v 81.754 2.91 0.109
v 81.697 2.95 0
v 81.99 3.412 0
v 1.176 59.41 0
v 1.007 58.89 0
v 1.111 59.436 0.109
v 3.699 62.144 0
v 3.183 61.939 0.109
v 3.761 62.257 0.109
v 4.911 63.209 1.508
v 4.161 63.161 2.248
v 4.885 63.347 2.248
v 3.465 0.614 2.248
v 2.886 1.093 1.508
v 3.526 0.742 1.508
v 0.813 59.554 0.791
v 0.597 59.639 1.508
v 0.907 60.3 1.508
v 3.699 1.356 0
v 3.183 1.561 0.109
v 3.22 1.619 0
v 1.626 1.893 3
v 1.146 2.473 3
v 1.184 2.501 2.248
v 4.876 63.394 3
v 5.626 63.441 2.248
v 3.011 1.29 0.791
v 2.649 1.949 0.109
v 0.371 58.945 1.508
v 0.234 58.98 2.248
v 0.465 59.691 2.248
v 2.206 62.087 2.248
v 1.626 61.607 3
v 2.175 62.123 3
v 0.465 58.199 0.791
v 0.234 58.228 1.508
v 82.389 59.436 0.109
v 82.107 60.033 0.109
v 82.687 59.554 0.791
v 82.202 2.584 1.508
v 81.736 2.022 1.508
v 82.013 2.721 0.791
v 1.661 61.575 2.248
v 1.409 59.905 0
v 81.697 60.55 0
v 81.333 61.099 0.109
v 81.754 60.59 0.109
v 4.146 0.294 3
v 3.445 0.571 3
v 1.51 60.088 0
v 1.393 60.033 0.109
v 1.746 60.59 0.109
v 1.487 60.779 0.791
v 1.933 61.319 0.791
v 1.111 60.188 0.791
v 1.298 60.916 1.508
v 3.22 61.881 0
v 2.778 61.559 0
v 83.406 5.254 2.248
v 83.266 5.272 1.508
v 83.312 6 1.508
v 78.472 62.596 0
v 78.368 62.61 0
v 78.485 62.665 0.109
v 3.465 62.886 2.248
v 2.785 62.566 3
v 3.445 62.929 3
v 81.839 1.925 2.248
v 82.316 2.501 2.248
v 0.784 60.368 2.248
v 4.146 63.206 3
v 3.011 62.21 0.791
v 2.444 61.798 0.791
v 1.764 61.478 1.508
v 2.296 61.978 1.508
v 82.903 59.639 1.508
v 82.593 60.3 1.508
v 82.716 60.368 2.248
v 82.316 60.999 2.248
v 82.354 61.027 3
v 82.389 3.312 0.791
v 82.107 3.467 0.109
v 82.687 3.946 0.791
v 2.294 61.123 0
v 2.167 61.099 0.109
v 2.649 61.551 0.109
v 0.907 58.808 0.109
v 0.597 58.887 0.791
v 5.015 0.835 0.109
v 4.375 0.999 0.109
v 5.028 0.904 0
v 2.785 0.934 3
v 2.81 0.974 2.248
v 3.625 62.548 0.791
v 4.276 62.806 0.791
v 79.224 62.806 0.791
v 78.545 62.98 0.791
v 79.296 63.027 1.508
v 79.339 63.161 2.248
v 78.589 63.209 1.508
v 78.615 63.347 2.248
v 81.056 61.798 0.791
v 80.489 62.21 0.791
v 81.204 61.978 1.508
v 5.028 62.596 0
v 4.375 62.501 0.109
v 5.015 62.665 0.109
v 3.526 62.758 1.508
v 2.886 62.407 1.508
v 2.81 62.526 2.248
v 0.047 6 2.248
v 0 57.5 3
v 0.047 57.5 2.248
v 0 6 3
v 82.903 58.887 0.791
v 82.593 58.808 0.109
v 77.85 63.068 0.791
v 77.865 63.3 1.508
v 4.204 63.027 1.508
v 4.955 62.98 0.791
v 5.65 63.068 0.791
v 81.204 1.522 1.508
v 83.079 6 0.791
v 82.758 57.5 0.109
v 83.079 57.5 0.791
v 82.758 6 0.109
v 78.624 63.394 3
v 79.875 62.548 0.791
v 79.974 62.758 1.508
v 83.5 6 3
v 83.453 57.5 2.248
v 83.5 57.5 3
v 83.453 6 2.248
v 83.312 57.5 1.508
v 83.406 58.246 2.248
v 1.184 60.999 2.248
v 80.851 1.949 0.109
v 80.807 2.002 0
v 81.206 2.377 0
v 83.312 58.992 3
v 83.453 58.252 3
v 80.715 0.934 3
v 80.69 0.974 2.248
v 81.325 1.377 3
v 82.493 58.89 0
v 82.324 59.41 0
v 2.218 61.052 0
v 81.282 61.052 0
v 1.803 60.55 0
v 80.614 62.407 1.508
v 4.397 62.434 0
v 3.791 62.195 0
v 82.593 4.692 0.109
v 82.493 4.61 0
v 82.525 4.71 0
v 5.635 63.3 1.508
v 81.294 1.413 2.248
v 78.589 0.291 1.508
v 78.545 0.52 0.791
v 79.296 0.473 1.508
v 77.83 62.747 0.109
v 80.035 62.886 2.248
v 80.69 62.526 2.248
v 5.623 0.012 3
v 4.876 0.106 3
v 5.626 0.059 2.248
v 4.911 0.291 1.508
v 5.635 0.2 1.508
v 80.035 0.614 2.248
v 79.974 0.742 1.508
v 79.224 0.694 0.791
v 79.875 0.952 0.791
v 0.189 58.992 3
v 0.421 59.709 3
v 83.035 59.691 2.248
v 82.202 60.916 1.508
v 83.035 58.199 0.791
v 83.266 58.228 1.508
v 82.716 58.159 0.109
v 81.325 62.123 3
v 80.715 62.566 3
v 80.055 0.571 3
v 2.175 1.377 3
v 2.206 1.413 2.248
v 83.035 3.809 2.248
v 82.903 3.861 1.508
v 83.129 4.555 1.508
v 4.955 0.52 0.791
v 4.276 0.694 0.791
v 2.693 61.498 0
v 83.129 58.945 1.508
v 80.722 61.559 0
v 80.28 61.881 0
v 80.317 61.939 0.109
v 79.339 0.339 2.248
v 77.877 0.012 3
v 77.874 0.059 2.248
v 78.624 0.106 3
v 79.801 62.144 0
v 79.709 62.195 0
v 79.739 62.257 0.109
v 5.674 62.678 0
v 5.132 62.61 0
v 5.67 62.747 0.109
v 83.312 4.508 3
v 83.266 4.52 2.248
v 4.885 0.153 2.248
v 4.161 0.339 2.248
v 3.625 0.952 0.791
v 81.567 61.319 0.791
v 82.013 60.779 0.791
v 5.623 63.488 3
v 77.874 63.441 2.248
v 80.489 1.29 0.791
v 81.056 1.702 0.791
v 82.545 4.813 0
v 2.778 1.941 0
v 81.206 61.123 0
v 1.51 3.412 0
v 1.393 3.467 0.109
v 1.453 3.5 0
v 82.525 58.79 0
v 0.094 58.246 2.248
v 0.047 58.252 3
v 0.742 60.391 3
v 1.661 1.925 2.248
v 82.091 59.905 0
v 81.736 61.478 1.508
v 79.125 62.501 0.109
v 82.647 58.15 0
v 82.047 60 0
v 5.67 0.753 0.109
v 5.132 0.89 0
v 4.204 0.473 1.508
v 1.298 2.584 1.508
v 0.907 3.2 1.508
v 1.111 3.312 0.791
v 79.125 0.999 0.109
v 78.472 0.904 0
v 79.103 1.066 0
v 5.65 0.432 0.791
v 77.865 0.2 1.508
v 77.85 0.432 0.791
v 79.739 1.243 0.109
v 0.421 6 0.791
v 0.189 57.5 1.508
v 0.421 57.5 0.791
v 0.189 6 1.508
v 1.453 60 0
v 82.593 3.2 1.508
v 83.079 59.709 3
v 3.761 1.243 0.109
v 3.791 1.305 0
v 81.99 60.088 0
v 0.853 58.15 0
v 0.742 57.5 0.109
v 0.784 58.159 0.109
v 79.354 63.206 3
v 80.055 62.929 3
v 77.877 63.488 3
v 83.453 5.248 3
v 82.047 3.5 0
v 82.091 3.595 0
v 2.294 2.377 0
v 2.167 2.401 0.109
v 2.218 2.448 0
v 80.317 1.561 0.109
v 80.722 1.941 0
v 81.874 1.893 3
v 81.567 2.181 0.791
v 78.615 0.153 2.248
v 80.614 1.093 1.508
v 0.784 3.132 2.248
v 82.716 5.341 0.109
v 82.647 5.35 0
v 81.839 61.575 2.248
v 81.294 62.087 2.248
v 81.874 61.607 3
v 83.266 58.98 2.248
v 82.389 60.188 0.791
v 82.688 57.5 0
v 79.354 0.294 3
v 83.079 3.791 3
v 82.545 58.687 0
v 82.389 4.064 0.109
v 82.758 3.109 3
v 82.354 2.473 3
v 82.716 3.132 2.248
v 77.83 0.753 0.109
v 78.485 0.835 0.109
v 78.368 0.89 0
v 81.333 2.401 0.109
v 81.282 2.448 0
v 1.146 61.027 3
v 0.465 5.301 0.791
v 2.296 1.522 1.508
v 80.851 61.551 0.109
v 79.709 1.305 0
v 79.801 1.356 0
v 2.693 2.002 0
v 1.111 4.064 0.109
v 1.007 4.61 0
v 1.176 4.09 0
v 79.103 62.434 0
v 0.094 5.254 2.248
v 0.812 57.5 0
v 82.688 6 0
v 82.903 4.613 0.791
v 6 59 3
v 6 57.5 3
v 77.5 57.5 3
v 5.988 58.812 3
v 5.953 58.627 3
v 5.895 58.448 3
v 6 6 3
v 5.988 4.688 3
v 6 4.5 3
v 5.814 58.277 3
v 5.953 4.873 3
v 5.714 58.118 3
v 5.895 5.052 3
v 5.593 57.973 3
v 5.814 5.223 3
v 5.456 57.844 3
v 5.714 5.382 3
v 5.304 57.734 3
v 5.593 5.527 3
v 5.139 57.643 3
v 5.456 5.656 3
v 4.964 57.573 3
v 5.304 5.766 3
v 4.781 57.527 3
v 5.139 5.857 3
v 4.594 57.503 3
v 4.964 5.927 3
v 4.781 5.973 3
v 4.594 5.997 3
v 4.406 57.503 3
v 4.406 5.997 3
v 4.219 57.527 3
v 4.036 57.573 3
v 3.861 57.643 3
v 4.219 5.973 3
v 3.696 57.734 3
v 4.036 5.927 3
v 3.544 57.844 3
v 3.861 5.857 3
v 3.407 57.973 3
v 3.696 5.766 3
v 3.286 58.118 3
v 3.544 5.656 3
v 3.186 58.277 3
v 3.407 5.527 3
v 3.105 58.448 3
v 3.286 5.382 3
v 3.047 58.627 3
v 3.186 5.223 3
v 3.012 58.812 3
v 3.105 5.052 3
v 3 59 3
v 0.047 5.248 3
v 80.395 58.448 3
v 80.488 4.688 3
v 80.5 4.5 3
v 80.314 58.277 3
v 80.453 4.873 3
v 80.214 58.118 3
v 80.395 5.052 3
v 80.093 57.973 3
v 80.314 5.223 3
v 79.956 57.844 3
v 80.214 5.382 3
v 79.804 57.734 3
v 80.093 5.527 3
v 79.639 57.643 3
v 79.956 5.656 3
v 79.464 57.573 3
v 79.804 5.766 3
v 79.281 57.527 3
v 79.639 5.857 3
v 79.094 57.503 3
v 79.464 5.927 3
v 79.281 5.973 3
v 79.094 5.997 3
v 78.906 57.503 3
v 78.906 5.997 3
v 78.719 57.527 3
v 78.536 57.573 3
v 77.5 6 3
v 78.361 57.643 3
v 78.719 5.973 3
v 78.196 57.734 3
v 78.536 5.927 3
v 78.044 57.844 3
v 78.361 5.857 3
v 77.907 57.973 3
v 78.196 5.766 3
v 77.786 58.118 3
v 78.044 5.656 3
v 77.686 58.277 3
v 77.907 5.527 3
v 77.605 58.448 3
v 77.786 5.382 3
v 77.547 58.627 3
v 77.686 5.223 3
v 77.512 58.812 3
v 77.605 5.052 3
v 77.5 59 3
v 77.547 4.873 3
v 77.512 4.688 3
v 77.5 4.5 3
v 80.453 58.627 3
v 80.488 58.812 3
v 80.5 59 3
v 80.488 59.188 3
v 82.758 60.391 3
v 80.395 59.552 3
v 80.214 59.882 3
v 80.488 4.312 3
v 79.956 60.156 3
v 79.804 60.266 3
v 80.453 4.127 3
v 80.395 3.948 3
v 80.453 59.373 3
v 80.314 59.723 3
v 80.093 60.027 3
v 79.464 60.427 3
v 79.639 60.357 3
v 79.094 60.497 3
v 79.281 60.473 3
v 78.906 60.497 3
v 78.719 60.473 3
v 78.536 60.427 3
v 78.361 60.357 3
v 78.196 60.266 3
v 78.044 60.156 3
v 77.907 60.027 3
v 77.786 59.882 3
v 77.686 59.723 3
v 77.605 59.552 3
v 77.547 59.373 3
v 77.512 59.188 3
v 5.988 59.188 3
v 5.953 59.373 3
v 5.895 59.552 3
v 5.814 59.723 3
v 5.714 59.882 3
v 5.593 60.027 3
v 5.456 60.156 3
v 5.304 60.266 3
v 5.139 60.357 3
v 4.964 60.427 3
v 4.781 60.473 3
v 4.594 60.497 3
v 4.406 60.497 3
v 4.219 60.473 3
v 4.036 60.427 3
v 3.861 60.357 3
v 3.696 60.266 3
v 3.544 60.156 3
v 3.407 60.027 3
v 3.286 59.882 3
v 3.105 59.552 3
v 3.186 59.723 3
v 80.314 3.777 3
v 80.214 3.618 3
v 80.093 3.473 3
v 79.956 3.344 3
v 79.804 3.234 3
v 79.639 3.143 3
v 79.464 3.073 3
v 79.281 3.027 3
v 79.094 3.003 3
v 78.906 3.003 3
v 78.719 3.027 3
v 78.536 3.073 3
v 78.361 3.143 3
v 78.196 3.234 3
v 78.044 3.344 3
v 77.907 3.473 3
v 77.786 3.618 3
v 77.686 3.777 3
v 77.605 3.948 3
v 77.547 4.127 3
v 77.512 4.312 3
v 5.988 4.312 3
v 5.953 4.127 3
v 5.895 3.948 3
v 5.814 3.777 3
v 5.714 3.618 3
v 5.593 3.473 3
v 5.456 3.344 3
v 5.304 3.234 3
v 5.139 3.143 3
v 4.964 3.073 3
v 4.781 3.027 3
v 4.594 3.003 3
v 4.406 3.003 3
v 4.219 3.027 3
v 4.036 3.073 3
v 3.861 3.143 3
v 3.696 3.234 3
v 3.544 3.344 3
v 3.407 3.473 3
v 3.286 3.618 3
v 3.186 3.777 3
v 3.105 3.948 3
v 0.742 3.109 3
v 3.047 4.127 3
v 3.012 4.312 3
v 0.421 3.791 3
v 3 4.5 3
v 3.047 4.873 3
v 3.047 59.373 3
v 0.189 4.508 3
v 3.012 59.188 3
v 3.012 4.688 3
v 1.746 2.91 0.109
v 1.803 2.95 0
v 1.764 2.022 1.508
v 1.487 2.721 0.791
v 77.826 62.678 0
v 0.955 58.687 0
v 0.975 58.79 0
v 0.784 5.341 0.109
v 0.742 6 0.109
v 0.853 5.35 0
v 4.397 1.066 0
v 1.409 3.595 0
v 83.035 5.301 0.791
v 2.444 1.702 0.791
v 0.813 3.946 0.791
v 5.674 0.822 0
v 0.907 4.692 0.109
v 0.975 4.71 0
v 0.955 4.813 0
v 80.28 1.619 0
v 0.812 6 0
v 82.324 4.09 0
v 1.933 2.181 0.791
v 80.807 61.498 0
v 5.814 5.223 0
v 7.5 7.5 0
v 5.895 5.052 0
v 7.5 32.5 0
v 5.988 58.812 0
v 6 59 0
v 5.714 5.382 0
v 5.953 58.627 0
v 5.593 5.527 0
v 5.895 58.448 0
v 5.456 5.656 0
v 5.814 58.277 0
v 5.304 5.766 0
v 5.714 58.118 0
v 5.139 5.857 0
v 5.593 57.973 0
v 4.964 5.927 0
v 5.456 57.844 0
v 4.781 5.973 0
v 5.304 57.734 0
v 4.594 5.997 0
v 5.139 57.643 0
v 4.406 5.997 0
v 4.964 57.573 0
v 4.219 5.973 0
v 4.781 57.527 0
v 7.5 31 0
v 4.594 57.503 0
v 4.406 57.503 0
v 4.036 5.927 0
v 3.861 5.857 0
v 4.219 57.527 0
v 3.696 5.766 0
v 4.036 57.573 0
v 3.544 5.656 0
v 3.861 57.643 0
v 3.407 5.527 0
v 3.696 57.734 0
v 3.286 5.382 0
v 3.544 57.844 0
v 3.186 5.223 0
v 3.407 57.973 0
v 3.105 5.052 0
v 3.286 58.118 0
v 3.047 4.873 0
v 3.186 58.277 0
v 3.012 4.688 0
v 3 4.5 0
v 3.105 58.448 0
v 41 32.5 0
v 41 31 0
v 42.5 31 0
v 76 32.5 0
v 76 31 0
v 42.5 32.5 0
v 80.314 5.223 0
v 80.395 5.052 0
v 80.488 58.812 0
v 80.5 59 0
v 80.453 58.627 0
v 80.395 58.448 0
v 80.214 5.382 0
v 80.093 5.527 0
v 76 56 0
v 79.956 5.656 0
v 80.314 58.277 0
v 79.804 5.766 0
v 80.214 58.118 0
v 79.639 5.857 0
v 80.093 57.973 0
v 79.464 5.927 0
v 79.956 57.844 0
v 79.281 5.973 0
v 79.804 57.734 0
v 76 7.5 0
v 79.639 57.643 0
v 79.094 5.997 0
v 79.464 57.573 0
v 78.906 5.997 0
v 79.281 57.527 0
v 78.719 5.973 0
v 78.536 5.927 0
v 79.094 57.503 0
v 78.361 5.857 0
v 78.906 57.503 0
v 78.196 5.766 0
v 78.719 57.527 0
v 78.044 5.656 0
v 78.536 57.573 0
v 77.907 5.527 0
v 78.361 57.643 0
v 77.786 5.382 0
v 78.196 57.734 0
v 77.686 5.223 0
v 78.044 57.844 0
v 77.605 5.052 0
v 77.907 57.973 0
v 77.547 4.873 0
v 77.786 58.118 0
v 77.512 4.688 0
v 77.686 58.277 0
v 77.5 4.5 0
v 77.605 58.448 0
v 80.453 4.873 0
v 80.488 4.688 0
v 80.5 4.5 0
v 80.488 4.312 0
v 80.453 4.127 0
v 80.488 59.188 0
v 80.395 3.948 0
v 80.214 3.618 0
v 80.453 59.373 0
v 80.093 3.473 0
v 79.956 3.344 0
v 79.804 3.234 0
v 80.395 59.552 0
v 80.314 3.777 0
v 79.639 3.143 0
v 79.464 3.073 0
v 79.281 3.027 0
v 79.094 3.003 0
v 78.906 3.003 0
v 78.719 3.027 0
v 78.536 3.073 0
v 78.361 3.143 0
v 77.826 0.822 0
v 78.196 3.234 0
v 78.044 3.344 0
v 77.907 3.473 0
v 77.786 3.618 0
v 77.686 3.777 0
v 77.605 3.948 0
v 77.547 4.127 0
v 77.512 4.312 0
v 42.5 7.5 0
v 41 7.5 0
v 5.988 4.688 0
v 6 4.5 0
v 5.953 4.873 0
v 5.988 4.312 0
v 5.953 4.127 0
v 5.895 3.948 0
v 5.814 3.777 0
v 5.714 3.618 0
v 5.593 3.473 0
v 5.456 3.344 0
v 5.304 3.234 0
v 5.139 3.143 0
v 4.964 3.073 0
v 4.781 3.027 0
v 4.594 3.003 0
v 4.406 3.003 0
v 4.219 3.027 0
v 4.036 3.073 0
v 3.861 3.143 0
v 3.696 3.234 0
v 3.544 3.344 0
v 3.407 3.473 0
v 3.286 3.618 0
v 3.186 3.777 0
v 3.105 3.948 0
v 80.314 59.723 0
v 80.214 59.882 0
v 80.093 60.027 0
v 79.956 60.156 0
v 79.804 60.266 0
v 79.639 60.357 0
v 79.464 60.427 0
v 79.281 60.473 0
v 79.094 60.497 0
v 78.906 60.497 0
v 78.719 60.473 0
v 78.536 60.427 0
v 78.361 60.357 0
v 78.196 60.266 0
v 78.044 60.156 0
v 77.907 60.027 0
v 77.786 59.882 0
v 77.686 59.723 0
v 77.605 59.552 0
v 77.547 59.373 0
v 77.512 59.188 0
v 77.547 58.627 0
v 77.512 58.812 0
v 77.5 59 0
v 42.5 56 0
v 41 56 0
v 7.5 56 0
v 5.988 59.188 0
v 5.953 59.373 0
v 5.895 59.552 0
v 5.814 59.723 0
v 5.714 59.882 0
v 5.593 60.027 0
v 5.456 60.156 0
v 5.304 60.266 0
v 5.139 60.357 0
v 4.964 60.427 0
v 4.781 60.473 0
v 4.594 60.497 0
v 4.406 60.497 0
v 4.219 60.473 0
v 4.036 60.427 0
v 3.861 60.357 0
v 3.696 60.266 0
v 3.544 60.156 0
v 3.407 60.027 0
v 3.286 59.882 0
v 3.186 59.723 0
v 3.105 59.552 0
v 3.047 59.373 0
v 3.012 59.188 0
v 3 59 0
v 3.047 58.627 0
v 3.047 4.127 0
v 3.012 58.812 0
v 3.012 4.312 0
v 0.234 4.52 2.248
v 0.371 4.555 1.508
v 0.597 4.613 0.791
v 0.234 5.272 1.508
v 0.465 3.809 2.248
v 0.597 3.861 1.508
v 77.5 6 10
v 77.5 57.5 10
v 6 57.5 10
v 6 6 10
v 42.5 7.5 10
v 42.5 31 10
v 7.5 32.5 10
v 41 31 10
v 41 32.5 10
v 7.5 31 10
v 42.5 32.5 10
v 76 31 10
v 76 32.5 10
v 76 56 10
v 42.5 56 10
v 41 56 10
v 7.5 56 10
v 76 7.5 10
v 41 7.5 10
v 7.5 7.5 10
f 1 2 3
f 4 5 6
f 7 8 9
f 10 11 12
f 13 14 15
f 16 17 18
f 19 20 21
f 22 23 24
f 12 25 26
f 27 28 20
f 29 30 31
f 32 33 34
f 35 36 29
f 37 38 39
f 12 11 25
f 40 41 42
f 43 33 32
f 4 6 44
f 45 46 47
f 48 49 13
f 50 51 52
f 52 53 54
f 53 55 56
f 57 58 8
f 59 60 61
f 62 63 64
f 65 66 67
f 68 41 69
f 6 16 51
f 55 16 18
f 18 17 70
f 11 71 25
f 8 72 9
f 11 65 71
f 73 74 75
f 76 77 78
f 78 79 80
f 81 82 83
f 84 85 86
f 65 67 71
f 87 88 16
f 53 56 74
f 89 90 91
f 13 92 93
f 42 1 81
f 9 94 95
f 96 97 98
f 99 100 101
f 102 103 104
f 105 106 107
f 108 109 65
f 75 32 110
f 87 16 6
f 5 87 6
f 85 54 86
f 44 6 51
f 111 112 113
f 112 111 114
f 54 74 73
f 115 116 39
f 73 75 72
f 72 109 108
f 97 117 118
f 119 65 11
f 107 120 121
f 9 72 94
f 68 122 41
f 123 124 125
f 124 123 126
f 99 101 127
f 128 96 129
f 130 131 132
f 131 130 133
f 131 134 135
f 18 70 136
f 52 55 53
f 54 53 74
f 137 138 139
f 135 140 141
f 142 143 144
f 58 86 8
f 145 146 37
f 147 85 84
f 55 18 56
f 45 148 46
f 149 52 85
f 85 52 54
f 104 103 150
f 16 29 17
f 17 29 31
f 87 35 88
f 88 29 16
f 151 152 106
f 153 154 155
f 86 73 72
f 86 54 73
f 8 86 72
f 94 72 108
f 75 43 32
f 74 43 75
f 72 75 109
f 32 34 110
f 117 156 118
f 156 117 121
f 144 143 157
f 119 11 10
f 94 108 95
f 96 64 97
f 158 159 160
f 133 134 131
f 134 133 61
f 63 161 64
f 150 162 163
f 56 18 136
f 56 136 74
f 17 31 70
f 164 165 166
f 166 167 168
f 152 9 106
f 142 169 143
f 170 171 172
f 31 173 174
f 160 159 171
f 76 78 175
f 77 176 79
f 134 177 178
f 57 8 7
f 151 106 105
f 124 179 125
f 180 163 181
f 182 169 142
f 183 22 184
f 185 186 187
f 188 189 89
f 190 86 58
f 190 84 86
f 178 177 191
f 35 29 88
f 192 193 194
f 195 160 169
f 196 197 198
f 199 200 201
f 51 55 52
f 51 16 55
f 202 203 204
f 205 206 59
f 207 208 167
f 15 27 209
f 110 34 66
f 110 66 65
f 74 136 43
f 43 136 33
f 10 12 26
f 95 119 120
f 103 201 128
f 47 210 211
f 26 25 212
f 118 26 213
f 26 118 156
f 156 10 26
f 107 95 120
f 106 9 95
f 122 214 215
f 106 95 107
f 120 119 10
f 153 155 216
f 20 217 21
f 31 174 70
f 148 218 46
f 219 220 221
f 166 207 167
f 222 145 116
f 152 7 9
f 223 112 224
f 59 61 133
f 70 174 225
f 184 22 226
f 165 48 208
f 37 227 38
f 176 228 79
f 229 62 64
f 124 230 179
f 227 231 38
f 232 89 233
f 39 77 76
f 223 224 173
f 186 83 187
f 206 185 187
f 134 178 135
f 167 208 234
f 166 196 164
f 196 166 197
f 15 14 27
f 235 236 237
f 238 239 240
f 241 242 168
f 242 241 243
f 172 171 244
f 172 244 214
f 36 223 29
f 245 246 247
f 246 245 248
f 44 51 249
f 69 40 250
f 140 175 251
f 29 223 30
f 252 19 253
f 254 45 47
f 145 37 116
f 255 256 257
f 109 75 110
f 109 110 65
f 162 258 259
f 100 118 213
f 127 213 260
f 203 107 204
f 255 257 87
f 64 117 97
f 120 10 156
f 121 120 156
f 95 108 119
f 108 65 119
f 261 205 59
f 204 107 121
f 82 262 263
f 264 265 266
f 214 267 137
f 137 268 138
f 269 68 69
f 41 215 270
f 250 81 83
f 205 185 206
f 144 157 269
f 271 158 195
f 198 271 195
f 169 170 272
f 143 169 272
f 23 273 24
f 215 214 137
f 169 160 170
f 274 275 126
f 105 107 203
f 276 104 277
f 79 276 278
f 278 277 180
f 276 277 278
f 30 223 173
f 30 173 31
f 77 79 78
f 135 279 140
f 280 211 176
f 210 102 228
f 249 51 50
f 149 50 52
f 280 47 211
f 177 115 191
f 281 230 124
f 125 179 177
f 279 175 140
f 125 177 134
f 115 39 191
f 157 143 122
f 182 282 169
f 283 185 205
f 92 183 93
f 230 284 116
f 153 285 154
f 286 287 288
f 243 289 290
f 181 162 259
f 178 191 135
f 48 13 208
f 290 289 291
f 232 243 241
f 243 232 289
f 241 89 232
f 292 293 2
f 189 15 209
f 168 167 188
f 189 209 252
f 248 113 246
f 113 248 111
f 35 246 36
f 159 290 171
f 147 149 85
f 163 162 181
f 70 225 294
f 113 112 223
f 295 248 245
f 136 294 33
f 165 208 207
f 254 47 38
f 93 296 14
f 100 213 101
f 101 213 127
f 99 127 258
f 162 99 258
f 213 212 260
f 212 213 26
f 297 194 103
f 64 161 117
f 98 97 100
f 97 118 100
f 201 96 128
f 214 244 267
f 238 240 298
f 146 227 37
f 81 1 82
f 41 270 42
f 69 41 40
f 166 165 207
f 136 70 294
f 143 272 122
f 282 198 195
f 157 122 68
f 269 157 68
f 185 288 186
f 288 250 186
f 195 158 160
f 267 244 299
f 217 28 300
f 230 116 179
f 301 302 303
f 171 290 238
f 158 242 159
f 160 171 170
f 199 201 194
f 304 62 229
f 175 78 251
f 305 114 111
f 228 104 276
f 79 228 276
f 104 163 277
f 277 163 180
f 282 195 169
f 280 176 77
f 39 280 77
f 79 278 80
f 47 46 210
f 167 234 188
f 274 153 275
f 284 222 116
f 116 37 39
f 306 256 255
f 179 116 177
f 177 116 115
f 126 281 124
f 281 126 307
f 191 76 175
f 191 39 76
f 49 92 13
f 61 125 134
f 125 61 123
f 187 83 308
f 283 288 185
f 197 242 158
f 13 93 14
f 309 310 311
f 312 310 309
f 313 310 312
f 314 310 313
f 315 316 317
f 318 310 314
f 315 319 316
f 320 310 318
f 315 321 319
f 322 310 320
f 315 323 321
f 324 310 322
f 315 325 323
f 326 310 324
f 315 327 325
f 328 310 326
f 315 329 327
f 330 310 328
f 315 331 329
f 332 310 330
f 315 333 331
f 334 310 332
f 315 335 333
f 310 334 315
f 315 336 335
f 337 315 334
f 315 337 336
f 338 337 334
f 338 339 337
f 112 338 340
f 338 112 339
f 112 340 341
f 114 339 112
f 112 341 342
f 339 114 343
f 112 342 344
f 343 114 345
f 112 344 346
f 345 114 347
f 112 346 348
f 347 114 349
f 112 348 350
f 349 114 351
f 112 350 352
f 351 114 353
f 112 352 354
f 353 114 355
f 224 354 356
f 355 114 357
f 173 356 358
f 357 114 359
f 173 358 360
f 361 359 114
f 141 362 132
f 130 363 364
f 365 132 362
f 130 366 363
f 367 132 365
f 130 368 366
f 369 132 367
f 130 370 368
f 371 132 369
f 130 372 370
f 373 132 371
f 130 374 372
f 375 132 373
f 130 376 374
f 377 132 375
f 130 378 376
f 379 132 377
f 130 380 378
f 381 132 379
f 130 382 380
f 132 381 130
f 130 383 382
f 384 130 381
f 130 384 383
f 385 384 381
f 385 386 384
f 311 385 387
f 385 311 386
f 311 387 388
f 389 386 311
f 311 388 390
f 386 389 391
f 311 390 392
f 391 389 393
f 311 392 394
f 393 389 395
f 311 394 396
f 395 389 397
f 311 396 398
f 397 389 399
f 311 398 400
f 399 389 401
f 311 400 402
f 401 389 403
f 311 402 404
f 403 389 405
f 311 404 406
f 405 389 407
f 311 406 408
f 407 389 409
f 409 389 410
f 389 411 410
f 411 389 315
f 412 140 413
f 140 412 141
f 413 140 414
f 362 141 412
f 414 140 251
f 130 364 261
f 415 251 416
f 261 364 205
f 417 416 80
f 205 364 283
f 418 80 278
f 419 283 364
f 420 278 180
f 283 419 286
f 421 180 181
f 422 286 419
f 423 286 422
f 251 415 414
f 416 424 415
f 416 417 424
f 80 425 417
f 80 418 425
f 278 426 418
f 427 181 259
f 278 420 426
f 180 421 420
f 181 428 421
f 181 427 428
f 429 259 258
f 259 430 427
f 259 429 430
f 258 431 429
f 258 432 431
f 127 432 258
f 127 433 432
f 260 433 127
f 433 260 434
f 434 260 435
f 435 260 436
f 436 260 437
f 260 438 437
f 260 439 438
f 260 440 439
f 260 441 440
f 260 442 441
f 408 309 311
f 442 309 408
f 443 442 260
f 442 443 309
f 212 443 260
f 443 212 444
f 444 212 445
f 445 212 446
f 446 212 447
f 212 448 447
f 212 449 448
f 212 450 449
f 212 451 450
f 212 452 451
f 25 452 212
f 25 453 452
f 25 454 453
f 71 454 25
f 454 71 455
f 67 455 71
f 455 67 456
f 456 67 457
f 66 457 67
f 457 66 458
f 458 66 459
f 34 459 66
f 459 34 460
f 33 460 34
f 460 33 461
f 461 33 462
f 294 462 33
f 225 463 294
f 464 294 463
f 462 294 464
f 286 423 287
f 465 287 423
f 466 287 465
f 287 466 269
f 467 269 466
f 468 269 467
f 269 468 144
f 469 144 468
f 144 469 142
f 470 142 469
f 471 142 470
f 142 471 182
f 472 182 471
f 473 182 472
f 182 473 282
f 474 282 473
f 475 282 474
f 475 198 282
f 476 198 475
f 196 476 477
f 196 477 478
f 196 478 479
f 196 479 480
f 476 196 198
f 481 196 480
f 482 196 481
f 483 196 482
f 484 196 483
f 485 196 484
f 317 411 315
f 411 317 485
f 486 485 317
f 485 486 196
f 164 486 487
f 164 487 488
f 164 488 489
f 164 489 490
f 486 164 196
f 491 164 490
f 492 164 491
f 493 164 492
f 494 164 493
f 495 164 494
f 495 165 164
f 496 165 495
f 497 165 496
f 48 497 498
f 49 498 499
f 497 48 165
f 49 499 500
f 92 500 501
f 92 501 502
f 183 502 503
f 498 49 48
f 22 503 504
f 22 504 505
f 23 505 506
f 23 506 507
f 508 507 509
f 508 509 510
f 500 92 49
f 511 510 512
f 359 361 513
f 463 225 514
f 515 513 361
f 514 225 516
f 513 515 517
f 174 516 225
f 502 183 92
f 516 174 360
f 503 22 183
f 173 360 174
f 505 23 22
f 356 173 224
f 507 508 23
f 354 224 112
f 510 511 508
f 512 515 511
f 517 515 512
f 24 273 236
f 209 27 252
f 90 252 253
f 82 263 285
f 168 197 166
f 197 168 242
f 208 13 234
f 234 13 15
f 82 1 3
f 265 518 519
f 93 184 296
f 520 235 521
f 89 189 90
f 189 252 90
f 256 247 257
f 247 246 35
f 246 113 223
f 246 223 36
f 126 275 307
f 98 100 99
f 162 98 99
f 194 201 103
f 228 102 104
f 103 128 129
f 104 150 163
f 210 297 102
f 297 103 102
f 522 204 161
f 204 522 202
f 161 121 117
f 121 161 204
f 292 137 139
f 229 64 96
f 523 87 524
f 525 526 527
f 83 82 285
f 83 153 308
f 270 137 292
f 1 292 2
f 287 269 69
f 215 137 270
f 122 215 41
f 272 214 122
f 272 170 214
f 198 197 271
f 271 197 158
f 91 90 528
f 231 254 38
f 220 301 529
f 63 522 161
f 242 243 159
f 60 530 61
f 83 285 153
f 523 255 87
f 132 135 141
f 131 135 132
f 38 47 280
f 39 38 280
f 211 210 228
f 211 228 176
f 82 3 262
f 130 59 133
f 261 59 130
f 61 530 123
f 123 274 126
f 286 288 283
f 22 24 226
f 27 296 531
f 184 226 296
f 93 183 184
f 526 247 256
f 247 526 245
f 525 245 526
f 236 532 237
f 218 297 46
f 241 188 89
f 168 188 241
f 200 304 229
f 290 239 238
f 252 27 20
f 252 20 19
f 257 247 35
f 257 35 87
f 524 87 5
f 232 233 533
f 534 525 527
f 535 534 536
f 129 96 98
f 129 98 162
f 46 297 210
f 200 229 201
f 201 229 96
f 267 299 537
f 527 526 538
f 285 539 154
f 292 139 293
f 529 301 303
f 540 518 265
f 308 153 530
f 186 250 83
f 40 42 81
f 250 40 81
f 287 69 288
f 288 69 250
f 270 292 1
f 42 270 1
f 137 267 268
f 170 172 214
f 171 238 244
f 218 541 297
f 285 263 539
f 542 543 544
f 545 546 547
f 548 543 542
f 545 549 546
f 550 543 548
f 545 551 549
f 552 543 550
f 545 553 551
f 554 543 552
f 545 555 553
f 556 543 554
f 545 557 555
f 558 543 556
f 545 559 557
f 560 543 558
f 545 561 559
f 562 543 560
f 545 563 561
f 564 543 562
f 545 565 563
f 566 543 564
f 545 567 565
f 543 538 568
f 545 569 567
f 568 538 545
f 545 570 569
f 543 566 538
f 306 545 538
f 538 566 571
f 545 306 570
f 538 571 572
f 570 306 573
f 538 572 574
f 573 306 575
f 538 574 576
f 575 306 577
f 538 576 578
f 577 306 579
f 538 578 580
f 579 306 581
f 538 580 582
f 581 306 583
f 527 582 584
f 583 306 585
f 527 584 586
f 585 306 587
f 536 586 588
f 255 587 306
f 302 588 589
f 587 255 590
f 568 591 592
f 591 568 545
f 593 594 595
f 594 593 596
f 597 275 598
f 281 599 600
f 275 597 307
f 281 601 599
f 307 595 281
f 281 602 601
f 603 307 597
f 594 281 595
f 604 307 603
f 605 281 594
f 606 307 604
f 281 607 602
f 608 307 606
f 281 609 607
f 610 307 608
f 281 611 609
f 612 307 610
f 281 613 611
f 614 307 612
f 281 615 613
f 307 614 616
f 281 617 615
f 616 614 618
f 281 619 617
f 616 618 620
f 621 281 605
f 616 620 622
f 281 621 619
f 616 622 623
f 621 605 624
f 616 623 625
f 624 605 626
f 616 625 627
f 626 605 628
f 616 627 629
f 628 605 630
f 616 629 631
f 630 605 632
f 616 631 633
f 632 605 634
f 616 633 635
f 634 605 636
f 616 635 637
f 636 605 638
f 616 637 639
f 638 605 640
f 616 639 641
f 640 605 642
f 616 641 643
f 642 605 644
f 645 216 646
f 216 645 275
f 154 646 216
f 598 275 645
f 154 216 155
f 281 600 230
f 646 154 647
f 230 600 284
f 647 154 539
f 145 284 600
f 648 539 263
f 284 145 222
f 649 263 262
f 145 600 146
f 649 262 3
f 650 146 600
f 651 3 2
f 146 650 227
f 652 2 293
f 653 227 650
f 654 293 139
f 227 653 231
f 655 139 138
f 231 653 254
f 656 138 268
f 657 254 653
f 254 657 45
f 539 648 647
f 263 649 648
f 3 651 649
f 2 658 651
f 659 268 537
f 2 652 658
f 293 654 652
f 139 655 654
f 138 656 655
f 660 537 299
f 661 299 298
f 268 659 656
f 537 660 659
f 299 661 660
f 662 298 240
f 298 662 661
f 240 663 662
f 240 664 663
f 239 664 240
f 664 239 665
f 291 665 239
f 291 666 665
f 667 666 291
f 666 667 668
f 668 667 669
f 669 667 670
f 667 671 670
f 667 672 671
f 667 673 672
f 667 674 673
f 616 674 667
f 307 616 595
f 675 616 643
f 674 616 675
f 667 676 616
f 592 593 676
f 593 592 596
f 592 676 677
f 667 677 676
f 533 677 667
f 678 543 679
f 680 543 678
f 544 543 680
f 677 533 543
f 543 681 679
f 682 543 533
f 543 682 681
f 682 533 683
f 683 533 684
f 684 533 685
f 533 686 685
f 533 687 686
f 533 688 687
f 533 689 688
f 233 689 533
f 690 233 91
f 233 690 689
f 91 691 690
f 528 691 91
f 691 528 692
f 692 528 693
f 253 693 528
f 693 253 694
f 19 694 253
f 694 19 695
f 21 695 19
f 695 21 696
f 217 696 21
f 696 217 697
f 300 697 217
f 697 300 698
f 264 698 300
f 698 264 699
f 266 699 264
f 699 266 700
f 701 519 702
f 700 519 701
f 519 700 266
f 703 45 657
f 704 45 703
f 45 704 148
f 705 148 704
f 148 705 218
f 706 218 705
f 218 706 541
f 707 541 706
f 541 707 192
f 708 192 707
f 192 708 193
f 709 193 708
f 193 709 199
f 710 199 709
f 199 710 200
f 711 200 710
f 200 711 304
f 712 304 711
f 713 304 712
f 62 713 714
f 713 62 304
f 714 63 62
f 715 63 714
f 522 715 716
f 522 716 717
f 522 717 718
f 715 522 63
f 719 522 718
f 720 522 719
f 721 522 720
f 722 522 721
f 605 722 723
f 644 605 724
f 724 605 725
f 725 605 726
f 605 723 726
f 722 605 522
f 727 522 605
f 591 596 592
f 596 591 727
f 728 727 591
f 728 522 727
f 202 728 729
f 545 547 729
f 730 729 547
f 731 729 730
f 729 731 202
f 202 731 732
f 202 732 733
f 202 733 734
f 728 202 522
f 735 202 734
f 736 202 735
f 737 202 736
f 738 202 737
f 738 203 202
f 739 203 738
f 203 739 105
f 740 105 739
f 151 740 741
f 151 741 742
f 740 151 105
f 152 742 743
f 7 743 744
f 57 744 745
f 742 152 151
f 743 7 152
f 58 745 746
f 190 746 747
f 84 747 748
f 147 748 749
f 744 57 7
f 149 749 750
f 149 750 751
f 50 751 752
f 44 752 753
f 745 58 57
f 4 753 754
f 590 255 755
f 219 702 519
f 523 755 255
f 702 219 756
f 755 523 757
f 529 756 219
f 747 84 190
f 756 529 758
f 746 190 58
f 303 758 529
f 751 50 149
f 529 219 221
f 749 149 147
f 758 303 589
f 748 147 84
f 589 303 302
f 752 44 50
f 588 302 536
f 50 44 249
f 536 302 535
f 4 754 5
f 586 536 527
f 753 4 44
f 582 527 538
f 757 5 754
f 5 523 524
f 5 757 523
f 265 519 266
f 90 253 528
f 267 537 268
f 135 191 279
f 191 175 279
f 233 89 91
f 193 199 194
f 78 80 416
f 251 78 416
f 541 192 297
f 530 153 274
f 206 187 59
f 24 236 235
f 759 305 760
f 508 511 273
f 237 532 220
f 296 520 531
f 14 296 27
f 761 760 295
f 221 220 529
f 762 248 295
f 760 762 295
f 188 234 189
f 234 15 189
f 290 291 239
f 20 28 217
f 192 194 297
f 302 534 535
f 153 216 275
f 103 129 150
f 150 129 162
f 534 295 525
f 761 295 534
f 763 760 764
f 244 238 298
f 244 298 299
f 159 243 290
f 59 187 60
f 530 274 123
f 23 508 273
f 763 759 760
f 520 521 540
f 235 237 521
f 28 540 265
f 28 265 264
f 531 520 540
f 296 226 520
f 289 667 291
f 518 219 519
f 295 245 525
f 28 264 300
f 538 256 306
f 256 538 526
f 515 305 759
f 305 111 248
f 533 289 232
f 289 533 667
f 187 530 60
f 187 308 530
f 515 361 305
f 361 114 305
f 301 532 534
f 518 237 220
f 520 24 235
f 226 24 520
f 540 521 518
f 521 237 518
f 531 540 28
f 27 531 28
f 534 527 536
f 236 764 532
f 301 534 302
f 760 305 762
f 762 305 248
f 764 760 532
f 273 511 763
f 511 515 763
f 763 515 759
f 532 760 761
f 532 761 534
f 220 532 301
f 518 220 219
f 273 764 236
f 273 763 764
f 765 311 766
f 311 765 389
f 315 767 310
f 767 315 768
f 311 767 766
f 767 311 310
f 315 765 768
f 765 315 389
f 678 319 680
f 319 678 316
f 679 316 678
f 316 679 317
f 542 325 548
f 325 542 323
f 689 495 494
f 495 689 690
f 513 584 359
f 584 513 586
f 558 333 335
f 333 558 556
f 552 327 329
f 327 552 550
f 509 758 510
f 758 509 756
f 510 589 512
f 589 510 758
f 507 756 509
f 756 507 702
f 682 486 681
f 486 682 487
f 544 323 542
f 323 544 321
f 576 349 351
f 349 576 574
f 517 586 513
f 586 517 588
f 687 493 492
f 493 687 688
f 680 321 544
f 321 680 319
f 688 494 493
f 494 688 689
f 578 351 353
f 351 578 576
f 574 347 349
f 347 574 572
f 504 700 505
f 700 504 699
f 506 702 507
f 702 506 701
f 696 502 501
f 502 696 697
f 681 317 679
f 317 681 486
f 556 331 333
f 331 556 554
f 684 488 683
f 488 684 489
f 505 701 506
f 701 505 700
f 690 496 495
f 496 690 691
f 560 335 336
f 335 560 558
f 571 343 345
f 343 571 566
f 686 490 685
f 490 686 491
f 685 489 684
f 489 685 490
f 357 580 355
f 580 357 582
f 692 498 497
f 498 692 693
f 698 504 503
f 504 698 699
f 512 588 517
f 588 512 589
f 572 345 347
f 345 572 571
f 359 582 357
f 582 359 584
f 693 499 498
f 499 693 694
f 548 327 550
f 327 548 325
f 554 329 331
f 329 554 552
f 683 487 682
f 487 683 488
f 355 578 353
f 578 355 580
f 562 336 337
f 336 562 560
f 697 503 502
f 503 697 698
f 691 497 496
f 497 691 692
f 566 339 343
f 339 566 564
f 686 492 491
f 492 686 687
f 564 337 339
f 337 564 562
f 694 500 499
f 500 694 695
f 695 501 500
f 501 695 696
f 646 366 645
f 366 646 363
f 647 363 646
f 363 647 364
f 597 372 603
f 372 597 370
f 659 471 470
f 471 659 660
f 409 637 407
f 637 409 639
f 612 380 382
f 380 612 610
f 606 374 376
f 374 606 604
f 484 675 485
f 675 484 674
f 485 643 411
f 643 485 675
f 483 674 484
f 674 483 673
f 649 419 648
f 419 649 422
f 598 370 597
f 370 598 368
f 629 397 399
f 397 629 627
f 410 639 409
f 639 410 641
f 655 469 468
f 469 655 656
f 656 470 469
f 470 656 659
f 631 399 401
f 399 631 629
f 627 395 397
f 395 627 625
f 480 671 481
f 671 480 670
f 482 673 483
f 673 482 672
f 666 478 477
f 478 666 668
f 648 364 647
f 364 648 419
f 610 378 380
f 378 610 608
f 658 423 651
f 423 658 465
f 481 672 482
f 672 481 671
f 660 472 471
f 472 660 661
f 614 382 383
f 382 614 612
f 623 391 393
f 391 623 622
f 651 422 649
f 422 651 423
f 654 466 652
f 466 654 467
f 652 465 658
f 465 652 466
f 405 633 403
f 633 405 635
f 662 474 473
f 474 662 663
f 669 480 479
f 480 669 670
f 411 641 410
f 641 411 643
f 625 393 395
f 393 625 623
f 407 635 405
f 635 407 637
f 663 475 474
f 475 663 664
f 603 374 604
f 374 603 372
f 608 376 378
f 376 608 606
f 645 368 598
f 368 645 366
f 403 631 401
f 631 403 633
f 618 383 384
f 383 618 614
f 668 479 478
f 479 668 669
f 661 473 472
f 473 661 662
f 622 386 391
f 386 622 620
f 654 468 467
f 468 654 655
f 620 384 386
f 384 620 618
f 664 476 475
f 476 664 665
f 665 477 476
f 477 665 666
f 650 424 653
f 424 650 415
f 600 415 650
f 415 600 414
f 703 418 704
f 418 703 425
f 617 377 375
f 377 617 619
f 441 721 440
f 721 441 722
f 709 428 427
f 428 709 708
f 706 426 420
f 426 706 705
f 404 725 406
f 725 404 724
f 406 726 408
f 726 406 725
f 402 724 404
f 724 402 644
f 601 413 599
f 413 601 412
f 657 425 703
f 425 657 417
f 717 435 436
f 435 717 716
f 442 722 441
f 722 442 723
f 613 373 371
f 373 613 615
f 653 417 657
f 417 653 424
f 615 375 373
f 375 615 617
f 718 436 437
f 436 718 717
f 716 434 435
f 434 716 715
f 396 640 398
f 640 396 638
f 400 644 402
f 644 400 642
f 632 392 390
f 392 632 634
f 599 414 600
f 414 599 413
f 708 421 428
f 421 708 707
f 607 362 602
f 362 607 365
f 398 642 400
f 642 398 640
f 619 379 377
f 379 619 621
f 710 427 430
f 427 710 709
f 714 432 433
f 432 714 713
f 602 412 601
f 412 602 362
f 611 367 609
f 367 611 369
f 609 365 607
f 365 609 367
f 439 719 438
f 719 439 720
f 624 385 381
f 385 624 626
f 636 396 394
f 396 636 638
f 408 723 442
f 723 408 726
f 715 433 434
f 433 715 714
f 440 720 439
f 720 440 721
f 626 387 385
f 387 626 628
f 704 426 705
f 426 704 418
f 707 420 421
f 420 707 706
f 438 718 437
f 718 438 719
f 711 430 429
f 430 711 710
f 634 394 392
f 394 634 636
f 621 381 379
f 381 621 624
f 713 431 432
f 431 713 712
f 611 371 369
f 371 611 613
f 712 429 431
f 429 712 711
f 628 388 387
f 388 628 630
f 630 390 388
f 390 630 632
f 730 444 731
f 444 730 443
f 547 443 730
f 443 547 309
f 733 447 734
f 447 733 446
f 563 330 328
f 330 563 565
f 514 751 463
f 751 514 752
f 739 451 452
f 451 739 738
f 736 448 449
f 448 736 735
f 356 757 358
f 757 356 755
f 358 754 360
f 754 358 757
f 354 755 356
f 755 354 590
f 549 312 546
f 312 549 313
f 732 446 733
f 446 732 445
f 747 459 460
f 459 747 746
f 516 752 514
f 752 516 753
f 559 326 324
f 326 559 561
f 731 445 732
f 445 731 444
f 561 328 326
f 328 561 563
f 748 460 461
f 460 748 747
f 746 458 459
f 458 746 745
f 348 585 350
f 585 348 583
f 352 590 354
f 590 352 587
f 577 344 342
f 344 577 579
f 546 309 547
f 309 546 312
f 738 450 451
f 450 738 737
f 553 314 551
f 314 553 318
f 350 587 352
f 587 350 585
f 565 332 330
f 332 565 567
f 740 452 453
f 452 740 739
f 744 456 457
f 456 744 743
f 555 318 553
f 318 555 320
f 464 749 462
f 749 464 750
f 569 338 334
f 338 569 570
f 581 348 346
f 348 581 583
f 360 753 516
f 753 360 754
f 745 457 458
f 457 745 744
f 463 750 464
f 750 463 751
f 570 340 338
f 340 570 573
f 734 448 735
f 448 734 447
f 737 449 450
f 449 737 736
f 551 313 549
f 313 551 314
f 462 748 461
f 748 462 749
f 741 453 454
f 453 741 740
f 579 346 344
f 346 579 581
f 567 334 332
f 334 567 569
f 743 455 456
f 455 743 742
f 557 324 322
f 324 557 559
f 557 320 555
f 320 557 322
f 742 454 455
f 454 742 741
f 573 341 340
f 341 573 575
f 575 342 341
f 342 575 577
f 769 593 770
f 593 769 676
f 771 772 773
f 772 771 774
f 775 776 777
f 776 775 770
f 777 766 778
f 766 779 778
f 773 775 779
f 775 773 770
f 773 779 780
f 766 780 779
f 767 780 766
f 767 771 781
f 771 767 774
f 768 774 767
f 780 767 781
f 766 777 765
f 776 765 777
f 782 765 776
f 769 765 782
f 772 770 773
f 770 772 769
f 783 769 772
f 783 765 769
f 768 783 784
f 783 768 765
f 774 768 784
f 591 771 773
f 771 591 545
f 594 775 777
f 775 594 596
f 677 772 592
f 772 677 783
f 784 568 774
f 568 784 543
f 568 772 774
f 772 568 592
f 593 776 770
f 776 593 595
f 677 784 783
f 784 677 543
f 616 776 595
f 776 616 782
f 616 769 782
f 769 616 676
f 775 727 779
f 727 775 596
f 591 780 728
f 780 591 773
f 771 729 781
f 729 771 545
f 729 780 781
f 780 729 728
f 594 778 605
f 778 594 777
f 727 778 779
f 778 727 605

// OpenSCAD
// file: face-plate.scad
module truncated_hemisphere(thickness)
{
	r = 2 * thickness;
	difference() {
		translate(v = [0, 0, thickness])
			sphere(r);
		translate(v = [0, 0, -r])
			cube(size = [2 * r, 2 * r, 2 * r], center = true);
		translate(v = [0, 0, 3 * thickness])
			cube(size = [2 * r, 2 * r, 2 * r], center = true);
	}
}

module face_plate(width, height, thickness)
{
	r = 2 * thickness;
	hull() {
		translate(v = [r, r, 0])
			truncated_hemisphere(r / 2);
		translate(v = [width - r, r, 0])
			truncated_hemisphere(r / 2);
		translate(v = [width - r, height - r, 0])
			truncated_hemisphere(r / 2);
		translate(v = [r, height - r, 0])
			truncated_hemisphere(r / 2);
	}
}
// file: large-switch-array-holder.scad
include <face-plate.scad>

/* This file provides 2 functions meant to be used:

   1. switch_array_holder(rows, cols);
   2. switch_holder_retaining_gasket(rows, cols);

*/


$fn = 50;

clearance = 0.5;
width = 33 + clearance;
height = 23 + clearance;
depth = 10;
outer_width = width + 3;
outer_height = height + 3;
edge_width = 6;

module switch_holder_screw_hole()
{
	translate(v = [0, 0, -1])
		cylinder(r1 = 1.5, r2 = 1.5, h = 10);
}

module switch_holder()
{
	translate(v = [0.5 * outer_width, 0.5 * outer_height, 0.5 * depth])
		difference() {
			cube(size = [outer_width, outer_height, depth], center = true);
			cube(size = [width, height, depth + 5], center = true);
		}
}

module switch_holder_array(r, c)
{
	union() {
		for (i = [0 : 1 : r - 1]) {
			translate(v = [0, (height + 1.5) * i, 0]) {
				for (j = [0 : 1 : c - 1]) {
					translate(v = [(width + 1.5) * j, 0, 0]) {
						switch_holder();
					}
				}
			}
		}
	}
}

module switch_holder_face_plate(r, c)
{
	w = c * (width + 1.5) + 1.5;
	h = r * (height + 1.5) + 1.5;
	thickness = 3;

	difference() {
		face_plate(w + 2 * edge_width, h + 2 * edge_width, 3);
		translate(v = [edge_width, edge_width, -3]) {
			cube(size = [w, h, 10]);
		}
		translate(v = [0.75 * edge_width, 0.75 * edge_width, 0])
			switch_holder_screw_hole();
		translate(v = [w + 1.25 * edge_width, 0.75 * edge_width, 0])
			switch_holder_screw_hole();
		translate(v = [w + 1.25 * edge_width, h + 1.25 * edge_width, 0])
			switch_holder_screw_hole();
		translate(v = [0.75 * edge_width, h + 1.25 * edge_width, 0])
			switch_holder_screw_hole();
	}
}

module switch_array_holder(r, c) {
	union() {
		switch_holder_face_plate(r, c);
		translate(v = [edge_width, edge_width, 0])
			switch_holder_array(r, c);
	}
}

module button_port()
{
	translate(v = [0, 0, -5])
		cube(size = [28.5, 19, 15]);
}

module switch_holder_retaining_gasket(r, c)
{
	w = c * (width + 1.5) + 1.5;
	h = r * (height + 1.5) + 1.5;
	difference() {
		face_plate(w + 2 * edge_width, h + 2 * edge_width, 3);
		translate(v = [edge_width + 4 , edge_width + 4, 0])
		for (i = [0 : 1 : r - 1]) {
			translate(v = [0, (height + 1.5) * i, 0]) {
				for (j = [0 : 1 : c - 1]) {
					translate(v = [(width + 1.5) * j, 0, 0]) {
						button_port();
					}
				}
			}
		}
		translate(v = [0.75 * edge_width, 0.75 * edge_width, 0])
			switch_holder_screw_hole();
		translate(v = [w + 1.25 * edge_width, 0.75 * edge_width, 0])
			switch_holder_screw_hole();
		translate(v = [w + 1.25 * edge_width, h + 1.25 * edge_width, 0])
			switch_holder_screw_hole();
		translate(v = [0.75 * edge_width, h + 1.25 * edge_width, 0])
			switch_holder_screw_hole();
		translate(v = [edge_width - 1, edge_width - 1, 2])
			cube(size = [c * (width + 2) + 2, r * (height + 2) + 2, 20]);
	}
}
/*
switch_array_holder(3, 4);
translate(v = [200, 0, 0])
	switch_holder_retaining_gasket(3, 4);
*/
// main file
rows=2;
cols=2;

include <large-switch-array-holder.scad>

switch_array_holder(rows, cols);
